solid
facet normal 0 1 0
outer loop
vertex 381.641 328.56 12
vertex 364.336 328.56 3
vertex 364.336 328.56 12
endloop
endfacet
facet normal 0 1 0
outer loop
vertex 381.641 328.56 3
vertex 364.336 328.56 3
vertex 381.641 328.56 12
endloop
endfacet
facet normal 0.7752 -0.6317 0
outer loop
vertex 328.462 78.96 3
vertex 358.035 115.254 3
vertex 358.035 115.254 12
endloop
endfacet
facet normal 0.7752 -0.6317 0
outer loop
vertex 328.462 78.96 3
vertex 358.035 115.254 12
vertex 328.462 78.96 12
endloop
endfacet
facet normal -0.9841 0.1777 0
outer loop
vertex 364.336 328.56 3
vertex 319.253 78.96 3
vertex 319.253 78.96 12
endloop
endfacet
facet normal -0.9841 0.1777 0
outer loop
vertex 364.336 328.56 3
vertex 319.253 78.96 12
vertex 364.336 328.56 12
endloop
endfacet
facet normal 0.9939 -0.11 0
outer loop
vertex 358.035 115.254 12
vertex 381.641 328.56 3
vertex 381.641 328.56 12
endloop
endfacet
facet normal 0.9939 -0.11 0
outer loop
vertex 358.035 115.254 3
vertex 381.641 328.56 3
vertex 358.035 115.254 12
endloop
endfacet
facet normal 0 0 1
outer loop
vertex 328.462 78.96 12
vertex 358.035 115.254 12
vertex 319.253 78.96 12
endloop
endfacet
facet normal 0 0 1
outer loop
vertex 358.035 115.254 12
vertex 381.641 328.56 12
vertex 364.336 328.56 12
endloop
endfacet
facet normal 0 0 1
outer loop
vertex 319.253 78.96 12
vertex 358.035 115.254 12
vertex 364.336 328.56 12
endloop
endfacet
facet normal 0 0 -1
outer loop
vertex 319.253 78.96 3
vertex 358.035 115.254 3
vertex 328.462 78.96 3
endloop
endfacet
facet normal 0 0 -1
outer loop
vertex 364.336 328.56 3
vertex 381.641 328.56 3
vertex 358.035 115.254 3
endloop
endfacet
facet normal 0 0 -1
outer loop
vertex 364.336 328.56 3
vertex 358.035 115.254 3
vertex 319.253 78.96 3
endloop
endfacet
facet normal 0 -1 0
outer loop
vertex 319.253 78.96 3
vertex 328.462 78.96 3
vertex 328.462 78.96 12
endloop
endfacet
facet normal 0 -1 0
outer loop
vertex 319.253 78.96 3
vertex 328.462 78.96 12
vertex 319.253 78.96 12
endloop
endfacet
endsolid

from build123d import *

# Parameters (mm, degrees)
BOSS_EXTRUDE1_DEPTH = 15
SCALE1_SCALE        = 0.6


with BuildPart() as part:
    # Sketch3 → Boss-Extrude1 (new body)
    with BuildSketch(Plane.XY):
        Polygon((400.577201165, 416), (361.233423479, 60.489600344), (311.944825715, 0), (296.597151769, 0), (371.734942748, 416), align=None)
    extrude(amount=BOSS_EXTRUDE1_DEPTH)


with BuildPart() as part_1:
    # Scale1: scaled about (353.237254905, 197.400686377, 7.5)
    add(part.part.scale(SCALE1_SCALE).moved(Location((141.294901962, 78.960274551, 3))))


solid = part_1.part
